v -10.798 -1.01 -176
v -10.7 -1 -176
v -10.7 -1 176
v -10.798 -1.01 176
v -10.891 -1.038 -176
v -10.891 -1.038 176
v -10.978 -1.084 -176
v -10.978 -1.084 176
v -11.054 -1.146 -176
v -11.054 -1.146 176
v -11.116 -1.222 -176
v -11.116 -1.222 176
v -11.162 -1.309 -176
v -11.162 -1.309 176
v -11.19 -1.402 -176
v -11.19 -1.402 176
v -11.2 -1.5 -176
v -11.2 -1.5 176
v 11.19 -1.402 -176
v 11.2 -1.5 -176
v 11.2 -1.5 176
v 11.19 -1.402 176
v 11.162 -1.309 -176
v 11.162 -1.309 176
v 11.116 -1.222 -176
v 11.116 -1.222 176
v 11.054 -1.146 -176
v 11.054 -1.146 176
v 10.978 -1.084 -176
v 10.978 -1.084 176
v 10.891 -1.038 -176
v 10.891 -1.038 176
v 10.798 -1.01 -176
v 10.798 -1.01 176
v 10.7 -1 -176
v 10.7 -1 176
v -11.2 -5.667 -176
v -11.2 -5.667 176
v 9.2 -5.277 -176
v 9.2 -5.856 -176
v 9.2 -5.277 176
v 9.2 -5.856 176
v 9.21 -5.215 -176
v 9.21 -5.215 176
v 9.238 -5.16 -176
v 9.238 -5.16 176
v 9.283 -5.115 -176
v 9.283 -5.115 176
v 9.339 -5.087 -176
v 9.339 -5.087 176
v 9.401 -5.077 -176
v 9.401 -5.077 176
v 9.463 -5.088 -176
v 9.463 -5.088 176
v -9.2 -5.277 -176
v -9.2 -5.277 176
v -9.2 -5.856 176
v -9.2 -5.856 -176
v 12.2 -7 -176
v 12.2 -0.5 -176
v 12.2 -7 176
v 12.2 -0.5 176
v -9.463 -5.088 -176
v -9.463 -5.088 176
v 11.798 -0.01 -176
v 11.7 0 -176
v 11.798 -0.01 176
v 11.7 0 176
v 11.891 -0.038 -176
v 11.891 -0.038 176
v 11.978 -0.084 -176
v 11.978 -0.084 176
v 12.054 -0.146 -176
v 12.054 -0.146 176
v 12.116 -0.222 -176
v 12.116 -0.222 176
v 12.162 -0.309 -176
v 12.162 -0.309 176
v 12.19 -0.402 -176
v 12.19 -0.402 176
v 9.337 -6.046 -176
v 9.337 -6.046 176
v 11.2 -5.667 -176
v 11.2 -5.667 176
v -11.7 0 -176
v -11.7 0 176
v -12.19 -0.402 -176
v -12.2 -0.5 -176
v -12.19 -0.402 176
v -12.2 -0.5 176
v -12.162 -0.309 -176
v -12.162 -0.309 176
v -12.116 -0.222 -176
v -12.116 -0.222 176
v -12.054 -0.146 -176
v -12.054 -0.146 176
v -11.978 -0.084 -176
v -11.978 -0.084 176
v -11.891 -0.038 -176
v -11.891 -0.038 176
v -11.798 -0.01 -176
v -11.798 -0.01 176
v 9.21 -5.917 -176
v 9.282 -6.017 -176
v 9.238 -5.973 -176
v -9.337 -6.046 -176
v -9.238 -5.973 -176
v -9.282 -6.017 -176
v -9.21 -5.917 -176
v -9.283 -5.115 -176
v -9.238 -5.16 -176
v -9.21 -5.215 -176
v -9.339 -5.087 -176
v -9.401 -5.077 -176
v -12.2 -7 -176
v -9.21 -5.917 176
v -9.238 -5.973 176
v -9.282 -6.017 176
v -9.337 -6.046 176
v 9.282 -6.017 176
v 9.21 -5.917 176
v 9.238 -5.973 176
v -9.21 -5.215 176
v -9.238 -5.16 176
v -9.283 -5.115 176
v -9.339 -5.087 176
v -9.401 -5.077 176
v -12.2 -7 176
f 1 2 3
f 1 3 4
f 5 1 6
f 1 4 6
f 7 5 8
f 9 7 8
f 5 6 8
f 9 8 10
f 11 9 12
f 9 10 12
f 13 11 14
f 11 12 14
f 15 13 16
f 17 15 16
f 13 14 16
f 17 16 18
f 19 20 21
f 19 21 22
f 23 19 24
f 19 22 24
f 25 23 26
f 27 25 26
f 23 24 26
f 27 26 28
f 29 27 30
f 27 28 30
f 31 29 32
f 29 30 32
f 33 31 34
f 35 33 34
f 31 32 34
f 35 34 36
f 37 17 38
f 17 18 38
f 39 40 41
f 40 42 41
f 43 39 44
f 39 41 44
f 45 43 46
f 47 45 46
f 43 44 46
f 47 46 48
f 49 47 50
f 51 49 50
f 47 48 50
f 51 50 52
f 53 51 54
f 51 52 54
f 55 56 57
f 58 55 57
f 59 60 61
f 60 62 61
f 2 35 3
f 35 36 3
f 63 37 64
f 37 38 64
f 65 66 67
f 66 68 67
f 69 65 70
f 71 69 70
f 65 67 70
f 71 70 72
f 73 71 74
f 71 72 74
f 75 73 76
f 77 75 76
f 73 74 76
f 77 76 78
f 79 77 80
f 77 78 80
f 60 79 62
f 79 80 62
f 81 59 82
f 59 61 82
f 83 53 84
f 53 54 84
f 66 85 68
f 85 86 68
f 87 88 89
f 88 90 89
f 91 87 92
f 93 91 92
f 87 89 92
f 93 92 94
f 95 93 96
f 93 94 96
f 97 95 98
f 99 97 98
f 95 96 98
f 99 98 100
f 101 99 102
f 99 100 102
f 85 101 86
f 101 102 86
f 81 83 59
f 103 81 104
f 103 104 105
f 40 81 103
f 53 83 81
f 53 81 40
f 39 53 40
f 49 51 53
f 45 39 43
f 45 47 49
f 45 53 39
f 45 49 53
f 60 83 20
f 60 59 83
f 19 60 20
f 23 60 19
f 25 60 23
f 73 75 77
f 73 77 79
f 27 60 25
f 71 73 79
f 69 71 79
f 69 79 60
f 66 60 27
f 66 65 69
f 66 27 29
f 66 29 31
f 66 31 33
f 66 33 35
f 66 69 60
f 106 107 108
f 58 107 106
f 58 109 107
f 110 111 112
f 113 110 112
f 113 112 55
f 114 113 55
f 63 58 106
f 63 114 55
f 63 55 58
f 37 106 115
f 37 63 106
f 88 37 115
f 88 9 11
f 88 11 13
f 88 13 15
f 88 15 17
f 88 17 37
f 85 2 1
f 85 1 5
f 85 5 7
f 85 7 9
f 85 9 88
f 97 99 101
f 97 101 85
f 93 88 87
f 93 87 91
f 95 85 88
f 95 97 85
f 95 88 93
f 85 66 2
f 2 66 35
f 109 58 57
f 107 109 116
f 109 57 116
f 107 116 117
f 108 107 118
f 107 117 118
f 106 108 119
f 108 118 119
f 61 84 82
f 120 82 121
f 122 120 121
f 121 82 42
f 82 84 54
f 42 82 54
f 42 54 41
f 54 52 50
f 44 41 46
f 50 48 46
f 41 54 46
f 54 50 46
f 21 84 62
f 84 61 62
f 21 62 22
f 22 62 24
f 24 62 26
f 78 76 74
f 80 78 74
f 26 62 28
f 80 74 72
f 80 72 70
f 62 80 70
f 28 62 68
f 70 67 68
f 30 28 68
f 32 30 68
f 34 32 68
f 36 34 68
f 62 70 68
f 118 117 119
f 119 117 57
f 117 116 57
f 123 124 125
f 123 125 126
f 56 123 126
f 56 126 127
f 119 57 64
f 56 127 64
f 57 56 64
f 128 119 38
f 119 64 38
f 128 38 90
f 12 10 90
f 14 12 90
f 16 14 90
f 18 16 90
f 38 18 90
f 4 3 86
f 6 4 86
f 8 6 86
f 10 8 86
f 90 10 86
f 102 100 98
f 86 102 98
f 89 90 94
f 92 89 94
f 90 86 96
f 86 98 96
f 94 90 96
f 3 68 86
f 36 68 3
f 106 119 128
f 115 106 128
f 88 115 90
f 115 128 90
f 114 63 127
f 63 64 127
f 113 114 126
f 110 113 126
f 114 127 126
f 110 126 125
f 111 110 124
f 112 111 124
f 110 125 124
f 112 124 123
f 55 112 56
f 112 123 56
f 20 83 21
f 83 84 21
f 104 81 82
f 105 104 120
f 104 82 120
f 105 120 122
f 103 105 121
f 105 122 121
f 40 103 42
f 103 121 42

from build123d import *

# Parameters (mm, degrees)
SALIENTE_EXTRUIR1_DEPTH = 176


with BuildPart() as part:
    # Croquis1 → Saliente-Extruir1 (new, symmetric)
    with BuildSketch(Plane.XY):
        with BuildLine():
            Line((-9.336754447, -6.045584816), (-12.2, -7))
            Line((-12.2, -7), (-12.2, -0.5))
            ThreePointArc((-12.2, -0.5), (-12.053553391, -0.146446609), (-11.7, 0))
            Line((-11.7, 0), (11.7, 0))
            ThreePointArc((11.7, 0), (12.053553391, -0.146446609), (12.2, -0.5))
            Line((12.2, -0.5), (12.2, -7))
            Line((12.2, -7), (9.336754447, -6.045584816))
            ThreePointArc((9.336754447, -6.045584816), (9.237751563, -5.972790213), (9.2, -5.855848156))
            Line((9.2, -5.855848156), (9.2, -5.277485177))
            ThreePointArc((9.2, -5.277485177), (9.283057943, -5.11523674), (9.463245553, -5.087748518))
            Line((9.463245553, -5.087748518), (11.2, -5.666666667))
            Line((11.2, -5.666666667), (11.2, -1.5))
            ThreePointArc((11.2, -1.5), (11.053553391, -1.146446609), (10.7, -1))
            Line((10.7, -1), (-10.7, -1))
            ThreePointArc((-10.7, -1), (-11.053553391, -1.146446609), (-11.2, -1.5))
            Line((-11.2, -1.5), (-11.2, -5.666666667))
            Line((-11.2, -5.666666667), (-9.463245553, -5.087748518))
            ThreePointArc((-9.463245553, -5.087748518), (-9.283057943, -5.11523674), (-9.2, -5.277485177))
            Line((-9.2, -5.277485177), (-9.2, -5.855848156))
            ThreePointArc((-9.2, -5.855848156), (-9.237751563, -5.972790213), (-9.336754447, -6.045584816))
        make_face()
    extrude(amount=SALIENTE_EXTRUIR1_DEPTH, both=True)


solid = part.part
